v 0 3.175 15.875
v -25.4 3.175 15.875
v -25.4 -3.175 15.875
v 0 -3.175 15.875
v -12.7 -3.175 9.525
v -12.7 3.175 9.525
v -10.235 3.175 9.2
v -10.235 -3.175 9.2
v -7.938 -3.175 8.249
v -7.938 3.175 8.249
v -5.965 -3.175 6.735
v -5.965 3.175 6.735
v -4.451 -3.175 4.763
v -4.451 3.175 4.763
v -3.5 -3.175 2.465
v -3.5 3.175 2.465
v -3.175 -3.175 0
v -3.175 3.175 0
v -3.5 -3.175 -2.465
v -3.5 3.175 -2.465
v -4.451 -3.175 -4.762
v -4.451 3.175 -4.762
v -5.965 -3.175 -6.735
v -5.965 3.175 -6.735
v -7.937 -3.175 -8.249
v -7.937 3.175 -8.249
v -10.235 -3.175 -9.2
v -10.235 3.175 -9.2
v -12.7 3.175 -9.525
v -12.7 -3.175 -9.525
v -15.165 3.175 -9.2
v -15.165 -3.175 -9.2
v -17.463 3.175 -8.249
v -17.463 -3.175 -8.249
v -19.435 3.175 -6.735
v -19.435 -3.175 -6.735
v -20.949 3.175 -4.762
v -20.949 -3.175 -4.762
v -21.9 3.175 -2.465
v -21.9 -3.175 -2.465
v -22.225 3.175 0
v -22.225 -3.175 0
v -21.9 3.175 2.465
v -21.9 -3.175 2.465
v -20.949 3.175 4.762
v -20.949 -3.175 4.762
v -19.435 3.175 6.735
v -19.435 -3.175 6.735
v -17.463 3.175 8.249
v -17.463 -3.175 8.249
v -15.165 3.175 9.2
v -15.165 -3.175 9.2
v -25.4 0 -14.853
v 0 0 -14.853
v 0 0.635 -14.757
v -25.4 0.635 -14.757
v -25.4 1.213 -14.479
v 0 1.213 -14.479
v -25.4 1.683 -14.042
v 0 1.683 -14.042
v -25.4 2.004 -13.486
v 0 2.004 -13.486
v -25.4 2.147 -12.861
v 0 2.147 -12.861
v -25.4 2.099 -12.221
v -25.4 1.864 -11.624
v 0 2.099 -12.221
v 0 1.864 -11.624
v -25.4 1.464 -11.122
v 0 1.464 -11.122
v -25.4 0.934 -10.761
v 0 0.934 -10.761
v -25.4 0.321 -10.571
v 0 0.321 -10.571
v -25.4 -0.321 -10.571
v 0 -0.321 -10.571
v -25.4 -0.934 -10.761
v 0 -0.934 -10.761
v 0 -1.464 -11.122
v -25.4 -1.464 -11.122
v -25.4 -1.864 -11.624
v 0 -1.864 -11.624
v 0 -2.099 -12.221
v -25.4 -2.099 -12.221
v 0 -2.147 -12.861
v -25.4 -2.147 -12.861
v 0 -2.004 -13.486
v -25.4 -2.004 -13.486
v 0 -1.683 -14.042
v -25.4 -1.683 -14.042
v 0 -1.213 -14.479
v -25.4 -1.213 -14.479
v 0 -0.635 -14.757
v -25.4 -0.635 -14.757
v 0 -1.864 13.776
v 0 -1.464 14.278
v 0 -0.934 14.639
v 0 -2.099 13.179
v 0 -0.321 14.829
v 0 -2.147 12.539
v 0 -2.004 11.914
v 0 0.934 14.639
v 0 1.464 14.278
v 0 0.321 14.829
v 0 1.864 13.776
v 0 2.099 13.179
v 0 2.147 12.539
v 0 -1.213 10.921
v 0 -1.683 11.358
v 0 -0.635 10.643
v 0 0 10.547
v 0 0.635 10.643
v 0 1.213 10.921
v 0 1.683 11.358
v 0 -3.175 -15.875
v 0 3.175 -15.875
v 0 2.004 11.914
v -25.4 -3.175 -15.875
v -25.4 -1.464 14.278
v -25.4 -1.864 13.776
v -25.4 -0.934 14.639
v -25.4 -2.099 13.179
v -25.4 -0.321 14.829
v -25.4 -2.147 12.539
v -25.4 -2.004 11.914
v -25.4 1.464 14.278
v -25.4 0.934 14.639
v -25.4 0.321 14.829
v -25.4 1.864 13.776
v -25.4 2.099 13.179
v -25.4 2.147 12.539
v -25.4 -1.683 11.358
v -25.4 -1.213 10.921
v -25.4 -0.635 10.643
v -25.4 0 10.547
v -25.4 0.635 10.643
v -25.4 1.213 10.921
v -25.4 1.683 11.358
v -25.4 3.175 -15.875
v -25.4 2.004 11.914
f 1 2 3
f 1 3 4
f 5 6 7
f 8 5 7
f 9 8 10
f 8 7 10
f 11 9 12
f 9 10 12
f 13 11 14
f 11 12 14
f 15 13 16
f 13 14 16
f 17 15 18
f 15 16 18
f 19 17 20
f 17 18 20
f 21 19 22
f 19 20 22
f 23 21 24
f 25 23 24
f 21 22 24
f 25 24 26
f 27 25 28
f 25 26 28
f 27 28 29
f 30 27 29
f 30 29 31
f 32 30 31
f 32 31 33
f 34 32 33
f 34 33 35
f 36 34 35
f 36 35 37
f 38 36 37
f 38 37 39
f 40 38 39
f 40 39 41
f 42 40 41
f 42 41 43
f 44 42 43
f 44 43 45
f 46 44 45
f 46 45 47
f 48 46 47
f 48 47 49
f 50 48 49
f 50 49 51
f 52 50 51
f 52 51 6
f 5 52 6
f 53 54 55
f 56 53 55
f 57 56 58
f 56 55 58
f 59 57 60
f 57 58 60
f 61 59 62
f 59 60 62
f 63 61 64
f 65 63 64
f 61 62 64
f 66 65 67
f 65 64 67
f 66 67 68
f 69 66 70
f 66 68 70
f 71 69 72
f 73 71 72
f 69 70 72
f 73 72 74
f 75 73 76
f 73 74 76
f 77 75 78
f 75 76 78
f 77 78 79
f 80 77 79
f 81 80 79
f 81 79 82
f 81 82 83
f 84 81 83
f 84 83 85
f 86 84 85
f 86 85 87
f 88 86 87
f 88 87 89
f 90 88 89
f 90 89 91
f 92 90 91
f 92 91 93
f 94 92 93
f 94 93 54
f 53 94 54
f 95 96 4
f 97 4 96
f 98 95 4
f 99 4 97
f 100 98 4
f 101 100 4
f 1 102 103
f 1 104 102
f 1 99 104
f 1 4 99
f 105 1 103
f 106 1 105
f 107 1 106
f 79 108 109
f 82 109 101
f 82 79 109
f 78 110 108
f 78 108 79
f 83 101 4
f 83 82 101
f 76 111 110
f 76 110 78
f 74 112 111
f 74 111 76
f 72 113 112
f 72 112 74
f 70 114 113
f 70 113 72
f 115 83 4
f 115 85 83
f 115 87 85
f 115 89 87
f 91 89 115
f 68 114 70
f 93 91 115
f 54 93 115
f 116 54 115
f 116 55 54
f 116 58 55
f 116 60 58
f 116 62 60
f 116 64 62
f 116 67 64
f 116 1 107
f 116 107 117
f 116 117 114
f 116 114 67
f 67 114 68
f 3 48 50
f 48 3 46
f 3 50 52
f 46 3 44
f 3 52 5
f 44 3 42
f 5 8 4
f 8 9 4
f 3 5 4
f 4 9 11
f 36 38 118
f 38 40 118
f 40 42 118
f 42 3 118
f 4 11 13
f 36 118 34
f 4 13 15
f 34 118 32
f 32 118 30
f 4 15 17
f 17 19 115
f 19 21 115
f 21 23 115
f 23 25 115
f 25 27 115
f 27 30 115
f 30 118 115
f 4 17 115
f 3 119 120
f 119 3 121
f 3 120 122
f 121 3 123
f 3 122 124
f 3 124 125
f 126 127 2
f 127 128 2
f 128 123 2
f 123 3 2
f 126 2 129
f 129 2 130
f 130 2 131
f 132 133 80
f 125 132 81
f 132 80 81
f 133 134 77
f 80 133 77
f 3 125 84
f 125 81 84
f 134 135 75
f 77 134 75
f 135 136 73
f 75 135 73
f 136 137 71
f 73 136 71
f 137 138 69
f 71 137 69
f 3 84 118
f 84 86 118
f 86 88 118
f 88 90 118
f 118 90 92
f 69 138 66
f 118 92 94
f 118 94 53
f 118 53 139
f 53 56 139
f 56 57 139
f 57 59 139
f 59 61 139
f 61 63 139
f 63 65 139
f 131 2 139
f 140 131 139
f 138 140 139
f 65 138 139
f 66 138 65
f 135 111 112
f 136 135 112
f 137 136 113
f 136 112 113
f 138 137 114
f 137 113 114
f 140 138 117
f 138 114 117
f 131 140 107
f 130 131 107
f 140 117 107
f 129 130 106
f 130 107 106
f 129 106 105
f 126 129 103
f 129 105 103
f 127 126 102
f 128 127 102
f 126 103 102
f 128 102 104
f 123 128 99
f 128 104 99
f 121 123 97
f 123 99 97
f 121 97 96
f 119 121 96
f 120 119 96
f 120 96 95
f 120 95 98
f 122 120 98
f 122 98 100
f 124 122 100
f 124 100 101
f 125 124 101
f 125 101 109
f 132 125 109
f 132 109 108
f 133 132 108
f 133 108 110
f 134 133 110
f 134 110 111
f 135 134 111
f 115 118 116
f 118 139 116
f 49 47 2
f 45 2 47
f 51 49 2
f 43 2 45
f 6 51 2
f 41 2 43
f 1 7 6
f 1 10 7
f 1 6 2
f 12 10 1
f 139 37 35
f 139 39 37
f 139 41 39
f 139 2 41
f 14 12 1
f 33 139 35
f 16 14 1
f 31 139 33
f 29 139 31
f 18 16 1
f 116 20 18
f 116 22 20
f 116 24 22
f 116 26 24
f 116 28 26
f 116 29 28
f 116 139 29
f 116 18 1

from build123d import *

# Parameters (mm, degrees)
SKETCH1_W           = 25.4
SKETCH1_H           = 31.75
BOSS_EXTRUDE1_DEPTH = 3.175
SKETCH3_R           = 2.15265
CUT_EXTRUDE1_DEPTH  = 31.120694713
SKETCH4_R           = 9.525
CUT_EXTRUDE2_DEPTH  = 31.618591166


with BuildPart() as part:
    # Sketch1 → Boss-Extrude1 (new, symmetric)
    with BuildSketch(Plane(origin=(0, 0, 0), x_dir=(1, 0, 0), z_dir=(0, 1, 0))):
        with Locations((-12.7, 0)):
            Rectangle(SKETCH1_W, SKETCH1_H)
    extrude(amount=BOSS_EXTRUDE1_DEPTH, both=True)

    # Sketch3 → Cut-Extrude1 (cut, through all)
    with BuildSketch(Plane(origin=(0, 0, 0), x_dir=(0, 0, -1), z_dir=(1, 0, 0))):
        with Locations((-12.7, 0)):
            Circle(SKETCH3_R)
        with Locations((12.7, 0)):
            Circle(SKETCH3_R)
    extrude(amount=-CUT_EXTRUDE1_DEPTH, mode=Mode.SUBTRACT)

    # Sketch4 → Cut-Extrude2 (cut, through all)
    with BuildSketch(Plane(origin=(0, 3.175, 0), x_dir=(1, 0, 0), z_dir=(0, 1, 0))):
        with Locations(Location((-12.7, 0, 0), (0, 0, 270))):
            Circle(SKETCH4_R)
    extrude(amount=-CUT_EXTRUDE2_DEPTH, mode=Mode.SUBTRACT)


solid = part.part
